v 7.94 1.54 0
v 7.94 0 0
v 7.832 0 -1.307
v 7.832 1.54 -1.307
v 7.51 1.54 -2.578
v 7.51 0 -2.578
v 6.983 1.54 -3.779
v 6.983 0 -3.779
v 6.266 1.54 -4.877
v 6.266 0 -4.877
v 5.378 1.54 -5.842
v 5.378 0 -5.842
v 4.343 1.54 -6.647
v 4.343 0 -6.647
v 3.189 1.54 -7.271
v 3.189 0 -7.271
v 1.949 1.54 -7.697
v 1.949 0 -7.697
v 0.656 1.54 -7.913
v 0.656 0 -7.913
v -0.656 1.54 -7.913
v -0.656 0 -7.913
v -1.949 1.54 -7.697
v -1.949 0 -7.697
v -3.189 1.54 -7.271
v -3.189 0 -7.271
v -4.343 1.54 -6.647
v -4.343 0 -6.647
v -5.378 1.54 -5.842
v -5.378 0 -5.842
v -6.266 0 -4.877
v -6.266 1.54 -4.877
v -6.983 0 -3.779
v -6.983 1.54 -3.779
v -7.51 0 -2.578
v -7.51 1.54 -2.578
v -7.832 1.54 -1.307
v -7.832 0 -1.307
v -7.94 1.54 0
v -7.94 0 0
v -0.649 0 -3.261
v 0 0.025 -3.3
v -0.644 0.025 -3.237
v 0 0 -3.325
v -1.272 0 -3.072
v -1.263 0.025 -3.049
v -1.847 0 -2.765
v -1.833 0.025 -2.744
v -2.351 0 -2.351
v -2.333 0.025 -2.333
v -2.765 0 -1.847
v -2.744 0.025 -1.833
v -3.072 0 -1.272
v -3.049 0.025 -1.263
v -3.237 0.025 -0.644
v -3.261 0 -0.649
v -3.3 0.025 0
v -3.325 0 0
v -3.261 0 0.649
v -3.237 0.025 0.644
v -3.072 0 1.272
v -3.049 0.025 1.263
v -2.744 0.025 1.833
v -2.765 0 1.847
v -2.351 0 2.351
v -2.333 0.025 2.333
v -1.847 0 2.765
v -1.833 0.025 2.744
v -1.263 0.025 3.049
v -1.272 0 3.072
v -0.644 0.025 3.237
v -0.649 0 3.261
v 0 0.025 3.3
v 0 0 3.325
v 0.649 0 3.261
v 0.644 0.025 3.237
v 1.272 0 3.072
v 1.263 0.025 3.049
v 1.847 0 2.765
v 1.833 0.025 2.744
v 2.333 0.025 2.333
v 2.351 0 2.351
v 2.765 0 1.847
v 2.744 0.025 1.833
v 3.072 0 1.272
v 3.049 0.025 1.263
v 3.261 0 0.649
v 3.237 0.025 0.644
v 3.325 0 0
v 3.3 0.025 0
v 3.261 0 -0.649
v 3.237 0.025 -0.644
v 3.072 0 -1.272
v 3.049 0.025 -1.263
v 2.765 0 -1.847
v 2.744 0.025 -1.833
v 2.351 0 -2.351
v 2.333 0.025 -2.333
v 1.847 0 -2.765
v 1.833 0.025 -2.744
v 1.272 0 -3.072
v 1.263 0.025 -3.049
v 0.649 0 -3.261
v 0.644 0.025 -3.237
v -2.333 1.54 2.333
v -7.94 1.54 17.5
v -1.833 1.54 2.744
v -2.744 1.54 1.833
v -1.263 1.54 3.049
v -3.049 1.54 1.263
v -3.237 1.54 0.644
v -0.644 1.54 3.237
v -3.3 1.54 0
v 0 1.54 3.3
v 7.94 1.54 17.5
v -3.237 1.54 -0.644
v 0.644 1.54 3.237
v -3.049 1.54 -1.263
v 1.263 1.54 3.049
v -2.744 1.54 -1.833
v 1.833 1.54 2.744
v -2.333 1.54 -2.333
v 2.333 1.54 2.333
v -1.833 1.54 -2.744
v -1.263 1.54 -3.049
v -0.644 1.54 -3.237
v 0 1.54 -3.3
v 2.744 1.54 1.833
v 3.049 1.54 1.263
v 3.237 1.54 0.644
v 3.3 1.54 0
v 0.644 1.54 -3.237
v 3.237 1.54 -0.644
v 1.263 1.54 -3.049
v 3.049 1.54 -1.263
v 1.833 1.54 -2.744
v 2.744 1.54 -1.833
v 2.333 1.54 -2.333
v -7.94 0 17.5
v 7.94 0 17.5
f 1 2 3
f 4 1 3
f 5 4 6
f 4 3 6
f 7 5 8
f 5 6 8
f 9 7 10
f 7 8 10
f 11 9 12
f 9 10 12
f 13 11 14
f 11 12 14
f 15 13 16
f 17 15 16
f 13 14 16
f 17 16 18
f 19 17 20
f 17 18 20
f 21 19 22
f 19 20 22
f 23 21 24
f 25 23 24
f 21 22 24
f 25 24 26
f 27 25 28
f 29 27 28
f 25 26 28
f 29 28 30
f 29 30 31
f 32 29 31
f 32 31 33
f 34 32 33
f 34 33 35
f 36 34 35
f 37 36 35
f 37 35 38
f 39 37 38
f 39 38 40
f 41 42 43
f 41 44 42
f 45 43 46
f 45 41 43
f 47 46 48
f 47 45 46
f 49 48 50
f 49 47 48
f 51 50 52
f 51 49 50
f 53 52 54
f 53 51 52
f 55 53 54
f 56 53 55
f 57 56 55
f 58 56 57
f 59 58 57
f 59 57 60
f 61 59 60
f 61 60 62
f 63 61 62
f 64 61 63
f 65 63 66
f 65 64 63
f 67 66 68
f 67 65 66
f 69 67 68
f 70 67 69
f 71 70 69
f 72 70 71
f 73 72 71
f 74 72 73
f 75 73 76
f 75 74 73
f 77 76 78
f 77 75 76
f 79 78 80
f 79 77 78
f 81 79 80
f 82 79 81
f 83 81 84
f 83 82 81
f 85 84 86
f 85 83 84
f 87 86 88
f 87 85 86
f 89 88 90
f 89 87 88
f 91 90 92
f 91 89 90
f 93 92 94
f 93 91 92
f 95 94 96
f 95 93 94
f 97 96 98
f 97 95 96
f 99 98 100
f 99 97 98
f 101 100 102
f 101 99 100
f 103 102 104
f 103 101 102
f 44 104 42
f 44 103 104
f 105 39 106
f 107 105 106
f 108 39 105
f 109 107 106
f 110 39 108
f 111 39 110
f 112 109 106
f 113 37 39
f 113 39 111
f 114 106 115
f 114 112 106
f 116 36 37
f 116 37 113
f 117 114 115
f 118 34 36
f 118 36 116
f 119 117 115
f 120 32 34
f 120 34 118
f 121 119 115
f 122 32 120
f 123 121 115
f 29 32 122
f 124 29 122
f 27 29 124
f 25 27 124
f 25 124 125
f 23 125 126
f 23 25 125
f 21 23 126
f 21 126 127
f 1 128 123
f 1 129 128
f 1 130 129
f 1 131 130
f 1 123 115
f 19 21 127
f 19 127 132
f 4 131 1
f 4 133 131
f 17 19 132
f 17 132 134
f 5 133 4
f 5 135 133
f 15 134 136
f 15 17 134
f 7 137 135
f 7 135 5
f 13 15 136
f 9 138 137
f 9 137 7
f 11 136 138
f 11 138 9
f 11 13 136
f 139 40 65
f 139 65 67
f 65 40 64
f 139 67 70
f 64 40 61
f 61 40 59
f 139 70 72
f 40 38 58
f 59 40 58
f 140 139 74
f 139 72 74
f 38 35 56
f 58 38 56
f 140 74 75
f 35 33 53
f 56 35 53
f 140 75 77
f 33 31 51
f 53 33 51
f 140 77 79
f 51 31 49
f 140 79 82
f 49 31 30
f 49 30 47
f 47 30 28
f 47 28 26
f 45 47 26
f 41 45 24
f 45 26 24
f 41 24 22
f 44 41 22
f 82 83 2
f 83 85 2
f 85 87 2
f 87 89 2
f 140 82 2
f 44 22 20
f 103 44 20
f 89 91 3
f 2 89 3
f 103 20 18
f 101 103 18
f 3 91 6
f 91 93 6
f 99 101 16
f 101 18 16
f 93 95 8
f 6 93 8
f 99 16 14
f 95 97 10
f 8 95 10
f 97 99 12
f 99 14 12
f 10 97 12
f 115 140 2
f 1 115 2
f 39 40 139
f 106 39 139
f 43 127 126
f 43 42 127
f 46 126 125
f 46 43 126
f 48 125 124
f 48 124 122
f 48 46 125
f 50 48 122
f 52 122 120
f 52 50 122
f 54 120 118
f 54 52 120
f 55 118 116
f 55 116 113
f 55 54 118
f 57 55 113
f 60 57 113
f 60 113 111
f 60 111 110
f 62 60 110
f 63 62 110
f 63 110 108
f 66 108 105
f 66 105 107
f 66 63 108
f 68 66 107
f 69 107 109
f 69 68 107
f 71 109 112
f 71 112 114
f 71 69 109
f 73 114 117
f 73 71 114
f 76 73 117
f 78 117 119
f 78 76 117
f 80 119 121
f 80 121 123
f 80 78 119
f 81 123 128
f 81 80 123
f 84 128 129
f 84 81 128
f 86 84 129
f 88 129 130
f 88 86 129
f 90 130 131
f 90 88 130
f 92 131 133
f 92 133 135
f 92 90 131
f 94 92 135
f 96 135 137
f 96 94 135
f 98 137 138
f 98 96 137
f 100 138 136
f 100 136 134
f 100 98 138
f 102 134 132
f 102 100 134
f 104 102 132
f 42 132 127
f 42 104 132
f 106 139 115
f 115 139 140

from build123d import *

# Parameters (mm, degrees)
SKETCH1_R           = 7.94
BOSS_EXTRUDE1_DEPTH = 1.54


with BuildPart() as part:
    # Sketch1 → Boss-Extrude1 (new body)
    with BuildSketch(Plane(origin=(0, 0, 0), x_dir=(1, 0, 0), z_dir=(0, 1, 0))):
        Circle(SKETCH1_R)
        with BuildLine():
            ThreePointArc((7.94, 0), (0, -7.94), (-7.94, 0))
            Line((-7.94, 0), (-7.94, -17.5))
            Line((-7.94, -17.5), (7.94, -17.5))
            Line((7.94, -17.5), (7.94, 0))
        make_face()
    extrude(amount=BOSS_EXTRUDE1_DEPTH)

    # Sketch3 → M6 Clearance Hole1 (revolve, cut)
    with BuildSketch(Plane(origin=(0, 0, 0), x_dir=(0, 0, -1), z_dir=(1, 0, 0))):
        Polygon((0, 0), (0, 1.54), (3.3, 1.54), (3.3, 0.025), (3.325, 0), align=None)
    revolve(axis=Axis((0, -6.35, 0), (0, 1, 0)), mode=Mode.SUBTRACT)


solid = part.part
